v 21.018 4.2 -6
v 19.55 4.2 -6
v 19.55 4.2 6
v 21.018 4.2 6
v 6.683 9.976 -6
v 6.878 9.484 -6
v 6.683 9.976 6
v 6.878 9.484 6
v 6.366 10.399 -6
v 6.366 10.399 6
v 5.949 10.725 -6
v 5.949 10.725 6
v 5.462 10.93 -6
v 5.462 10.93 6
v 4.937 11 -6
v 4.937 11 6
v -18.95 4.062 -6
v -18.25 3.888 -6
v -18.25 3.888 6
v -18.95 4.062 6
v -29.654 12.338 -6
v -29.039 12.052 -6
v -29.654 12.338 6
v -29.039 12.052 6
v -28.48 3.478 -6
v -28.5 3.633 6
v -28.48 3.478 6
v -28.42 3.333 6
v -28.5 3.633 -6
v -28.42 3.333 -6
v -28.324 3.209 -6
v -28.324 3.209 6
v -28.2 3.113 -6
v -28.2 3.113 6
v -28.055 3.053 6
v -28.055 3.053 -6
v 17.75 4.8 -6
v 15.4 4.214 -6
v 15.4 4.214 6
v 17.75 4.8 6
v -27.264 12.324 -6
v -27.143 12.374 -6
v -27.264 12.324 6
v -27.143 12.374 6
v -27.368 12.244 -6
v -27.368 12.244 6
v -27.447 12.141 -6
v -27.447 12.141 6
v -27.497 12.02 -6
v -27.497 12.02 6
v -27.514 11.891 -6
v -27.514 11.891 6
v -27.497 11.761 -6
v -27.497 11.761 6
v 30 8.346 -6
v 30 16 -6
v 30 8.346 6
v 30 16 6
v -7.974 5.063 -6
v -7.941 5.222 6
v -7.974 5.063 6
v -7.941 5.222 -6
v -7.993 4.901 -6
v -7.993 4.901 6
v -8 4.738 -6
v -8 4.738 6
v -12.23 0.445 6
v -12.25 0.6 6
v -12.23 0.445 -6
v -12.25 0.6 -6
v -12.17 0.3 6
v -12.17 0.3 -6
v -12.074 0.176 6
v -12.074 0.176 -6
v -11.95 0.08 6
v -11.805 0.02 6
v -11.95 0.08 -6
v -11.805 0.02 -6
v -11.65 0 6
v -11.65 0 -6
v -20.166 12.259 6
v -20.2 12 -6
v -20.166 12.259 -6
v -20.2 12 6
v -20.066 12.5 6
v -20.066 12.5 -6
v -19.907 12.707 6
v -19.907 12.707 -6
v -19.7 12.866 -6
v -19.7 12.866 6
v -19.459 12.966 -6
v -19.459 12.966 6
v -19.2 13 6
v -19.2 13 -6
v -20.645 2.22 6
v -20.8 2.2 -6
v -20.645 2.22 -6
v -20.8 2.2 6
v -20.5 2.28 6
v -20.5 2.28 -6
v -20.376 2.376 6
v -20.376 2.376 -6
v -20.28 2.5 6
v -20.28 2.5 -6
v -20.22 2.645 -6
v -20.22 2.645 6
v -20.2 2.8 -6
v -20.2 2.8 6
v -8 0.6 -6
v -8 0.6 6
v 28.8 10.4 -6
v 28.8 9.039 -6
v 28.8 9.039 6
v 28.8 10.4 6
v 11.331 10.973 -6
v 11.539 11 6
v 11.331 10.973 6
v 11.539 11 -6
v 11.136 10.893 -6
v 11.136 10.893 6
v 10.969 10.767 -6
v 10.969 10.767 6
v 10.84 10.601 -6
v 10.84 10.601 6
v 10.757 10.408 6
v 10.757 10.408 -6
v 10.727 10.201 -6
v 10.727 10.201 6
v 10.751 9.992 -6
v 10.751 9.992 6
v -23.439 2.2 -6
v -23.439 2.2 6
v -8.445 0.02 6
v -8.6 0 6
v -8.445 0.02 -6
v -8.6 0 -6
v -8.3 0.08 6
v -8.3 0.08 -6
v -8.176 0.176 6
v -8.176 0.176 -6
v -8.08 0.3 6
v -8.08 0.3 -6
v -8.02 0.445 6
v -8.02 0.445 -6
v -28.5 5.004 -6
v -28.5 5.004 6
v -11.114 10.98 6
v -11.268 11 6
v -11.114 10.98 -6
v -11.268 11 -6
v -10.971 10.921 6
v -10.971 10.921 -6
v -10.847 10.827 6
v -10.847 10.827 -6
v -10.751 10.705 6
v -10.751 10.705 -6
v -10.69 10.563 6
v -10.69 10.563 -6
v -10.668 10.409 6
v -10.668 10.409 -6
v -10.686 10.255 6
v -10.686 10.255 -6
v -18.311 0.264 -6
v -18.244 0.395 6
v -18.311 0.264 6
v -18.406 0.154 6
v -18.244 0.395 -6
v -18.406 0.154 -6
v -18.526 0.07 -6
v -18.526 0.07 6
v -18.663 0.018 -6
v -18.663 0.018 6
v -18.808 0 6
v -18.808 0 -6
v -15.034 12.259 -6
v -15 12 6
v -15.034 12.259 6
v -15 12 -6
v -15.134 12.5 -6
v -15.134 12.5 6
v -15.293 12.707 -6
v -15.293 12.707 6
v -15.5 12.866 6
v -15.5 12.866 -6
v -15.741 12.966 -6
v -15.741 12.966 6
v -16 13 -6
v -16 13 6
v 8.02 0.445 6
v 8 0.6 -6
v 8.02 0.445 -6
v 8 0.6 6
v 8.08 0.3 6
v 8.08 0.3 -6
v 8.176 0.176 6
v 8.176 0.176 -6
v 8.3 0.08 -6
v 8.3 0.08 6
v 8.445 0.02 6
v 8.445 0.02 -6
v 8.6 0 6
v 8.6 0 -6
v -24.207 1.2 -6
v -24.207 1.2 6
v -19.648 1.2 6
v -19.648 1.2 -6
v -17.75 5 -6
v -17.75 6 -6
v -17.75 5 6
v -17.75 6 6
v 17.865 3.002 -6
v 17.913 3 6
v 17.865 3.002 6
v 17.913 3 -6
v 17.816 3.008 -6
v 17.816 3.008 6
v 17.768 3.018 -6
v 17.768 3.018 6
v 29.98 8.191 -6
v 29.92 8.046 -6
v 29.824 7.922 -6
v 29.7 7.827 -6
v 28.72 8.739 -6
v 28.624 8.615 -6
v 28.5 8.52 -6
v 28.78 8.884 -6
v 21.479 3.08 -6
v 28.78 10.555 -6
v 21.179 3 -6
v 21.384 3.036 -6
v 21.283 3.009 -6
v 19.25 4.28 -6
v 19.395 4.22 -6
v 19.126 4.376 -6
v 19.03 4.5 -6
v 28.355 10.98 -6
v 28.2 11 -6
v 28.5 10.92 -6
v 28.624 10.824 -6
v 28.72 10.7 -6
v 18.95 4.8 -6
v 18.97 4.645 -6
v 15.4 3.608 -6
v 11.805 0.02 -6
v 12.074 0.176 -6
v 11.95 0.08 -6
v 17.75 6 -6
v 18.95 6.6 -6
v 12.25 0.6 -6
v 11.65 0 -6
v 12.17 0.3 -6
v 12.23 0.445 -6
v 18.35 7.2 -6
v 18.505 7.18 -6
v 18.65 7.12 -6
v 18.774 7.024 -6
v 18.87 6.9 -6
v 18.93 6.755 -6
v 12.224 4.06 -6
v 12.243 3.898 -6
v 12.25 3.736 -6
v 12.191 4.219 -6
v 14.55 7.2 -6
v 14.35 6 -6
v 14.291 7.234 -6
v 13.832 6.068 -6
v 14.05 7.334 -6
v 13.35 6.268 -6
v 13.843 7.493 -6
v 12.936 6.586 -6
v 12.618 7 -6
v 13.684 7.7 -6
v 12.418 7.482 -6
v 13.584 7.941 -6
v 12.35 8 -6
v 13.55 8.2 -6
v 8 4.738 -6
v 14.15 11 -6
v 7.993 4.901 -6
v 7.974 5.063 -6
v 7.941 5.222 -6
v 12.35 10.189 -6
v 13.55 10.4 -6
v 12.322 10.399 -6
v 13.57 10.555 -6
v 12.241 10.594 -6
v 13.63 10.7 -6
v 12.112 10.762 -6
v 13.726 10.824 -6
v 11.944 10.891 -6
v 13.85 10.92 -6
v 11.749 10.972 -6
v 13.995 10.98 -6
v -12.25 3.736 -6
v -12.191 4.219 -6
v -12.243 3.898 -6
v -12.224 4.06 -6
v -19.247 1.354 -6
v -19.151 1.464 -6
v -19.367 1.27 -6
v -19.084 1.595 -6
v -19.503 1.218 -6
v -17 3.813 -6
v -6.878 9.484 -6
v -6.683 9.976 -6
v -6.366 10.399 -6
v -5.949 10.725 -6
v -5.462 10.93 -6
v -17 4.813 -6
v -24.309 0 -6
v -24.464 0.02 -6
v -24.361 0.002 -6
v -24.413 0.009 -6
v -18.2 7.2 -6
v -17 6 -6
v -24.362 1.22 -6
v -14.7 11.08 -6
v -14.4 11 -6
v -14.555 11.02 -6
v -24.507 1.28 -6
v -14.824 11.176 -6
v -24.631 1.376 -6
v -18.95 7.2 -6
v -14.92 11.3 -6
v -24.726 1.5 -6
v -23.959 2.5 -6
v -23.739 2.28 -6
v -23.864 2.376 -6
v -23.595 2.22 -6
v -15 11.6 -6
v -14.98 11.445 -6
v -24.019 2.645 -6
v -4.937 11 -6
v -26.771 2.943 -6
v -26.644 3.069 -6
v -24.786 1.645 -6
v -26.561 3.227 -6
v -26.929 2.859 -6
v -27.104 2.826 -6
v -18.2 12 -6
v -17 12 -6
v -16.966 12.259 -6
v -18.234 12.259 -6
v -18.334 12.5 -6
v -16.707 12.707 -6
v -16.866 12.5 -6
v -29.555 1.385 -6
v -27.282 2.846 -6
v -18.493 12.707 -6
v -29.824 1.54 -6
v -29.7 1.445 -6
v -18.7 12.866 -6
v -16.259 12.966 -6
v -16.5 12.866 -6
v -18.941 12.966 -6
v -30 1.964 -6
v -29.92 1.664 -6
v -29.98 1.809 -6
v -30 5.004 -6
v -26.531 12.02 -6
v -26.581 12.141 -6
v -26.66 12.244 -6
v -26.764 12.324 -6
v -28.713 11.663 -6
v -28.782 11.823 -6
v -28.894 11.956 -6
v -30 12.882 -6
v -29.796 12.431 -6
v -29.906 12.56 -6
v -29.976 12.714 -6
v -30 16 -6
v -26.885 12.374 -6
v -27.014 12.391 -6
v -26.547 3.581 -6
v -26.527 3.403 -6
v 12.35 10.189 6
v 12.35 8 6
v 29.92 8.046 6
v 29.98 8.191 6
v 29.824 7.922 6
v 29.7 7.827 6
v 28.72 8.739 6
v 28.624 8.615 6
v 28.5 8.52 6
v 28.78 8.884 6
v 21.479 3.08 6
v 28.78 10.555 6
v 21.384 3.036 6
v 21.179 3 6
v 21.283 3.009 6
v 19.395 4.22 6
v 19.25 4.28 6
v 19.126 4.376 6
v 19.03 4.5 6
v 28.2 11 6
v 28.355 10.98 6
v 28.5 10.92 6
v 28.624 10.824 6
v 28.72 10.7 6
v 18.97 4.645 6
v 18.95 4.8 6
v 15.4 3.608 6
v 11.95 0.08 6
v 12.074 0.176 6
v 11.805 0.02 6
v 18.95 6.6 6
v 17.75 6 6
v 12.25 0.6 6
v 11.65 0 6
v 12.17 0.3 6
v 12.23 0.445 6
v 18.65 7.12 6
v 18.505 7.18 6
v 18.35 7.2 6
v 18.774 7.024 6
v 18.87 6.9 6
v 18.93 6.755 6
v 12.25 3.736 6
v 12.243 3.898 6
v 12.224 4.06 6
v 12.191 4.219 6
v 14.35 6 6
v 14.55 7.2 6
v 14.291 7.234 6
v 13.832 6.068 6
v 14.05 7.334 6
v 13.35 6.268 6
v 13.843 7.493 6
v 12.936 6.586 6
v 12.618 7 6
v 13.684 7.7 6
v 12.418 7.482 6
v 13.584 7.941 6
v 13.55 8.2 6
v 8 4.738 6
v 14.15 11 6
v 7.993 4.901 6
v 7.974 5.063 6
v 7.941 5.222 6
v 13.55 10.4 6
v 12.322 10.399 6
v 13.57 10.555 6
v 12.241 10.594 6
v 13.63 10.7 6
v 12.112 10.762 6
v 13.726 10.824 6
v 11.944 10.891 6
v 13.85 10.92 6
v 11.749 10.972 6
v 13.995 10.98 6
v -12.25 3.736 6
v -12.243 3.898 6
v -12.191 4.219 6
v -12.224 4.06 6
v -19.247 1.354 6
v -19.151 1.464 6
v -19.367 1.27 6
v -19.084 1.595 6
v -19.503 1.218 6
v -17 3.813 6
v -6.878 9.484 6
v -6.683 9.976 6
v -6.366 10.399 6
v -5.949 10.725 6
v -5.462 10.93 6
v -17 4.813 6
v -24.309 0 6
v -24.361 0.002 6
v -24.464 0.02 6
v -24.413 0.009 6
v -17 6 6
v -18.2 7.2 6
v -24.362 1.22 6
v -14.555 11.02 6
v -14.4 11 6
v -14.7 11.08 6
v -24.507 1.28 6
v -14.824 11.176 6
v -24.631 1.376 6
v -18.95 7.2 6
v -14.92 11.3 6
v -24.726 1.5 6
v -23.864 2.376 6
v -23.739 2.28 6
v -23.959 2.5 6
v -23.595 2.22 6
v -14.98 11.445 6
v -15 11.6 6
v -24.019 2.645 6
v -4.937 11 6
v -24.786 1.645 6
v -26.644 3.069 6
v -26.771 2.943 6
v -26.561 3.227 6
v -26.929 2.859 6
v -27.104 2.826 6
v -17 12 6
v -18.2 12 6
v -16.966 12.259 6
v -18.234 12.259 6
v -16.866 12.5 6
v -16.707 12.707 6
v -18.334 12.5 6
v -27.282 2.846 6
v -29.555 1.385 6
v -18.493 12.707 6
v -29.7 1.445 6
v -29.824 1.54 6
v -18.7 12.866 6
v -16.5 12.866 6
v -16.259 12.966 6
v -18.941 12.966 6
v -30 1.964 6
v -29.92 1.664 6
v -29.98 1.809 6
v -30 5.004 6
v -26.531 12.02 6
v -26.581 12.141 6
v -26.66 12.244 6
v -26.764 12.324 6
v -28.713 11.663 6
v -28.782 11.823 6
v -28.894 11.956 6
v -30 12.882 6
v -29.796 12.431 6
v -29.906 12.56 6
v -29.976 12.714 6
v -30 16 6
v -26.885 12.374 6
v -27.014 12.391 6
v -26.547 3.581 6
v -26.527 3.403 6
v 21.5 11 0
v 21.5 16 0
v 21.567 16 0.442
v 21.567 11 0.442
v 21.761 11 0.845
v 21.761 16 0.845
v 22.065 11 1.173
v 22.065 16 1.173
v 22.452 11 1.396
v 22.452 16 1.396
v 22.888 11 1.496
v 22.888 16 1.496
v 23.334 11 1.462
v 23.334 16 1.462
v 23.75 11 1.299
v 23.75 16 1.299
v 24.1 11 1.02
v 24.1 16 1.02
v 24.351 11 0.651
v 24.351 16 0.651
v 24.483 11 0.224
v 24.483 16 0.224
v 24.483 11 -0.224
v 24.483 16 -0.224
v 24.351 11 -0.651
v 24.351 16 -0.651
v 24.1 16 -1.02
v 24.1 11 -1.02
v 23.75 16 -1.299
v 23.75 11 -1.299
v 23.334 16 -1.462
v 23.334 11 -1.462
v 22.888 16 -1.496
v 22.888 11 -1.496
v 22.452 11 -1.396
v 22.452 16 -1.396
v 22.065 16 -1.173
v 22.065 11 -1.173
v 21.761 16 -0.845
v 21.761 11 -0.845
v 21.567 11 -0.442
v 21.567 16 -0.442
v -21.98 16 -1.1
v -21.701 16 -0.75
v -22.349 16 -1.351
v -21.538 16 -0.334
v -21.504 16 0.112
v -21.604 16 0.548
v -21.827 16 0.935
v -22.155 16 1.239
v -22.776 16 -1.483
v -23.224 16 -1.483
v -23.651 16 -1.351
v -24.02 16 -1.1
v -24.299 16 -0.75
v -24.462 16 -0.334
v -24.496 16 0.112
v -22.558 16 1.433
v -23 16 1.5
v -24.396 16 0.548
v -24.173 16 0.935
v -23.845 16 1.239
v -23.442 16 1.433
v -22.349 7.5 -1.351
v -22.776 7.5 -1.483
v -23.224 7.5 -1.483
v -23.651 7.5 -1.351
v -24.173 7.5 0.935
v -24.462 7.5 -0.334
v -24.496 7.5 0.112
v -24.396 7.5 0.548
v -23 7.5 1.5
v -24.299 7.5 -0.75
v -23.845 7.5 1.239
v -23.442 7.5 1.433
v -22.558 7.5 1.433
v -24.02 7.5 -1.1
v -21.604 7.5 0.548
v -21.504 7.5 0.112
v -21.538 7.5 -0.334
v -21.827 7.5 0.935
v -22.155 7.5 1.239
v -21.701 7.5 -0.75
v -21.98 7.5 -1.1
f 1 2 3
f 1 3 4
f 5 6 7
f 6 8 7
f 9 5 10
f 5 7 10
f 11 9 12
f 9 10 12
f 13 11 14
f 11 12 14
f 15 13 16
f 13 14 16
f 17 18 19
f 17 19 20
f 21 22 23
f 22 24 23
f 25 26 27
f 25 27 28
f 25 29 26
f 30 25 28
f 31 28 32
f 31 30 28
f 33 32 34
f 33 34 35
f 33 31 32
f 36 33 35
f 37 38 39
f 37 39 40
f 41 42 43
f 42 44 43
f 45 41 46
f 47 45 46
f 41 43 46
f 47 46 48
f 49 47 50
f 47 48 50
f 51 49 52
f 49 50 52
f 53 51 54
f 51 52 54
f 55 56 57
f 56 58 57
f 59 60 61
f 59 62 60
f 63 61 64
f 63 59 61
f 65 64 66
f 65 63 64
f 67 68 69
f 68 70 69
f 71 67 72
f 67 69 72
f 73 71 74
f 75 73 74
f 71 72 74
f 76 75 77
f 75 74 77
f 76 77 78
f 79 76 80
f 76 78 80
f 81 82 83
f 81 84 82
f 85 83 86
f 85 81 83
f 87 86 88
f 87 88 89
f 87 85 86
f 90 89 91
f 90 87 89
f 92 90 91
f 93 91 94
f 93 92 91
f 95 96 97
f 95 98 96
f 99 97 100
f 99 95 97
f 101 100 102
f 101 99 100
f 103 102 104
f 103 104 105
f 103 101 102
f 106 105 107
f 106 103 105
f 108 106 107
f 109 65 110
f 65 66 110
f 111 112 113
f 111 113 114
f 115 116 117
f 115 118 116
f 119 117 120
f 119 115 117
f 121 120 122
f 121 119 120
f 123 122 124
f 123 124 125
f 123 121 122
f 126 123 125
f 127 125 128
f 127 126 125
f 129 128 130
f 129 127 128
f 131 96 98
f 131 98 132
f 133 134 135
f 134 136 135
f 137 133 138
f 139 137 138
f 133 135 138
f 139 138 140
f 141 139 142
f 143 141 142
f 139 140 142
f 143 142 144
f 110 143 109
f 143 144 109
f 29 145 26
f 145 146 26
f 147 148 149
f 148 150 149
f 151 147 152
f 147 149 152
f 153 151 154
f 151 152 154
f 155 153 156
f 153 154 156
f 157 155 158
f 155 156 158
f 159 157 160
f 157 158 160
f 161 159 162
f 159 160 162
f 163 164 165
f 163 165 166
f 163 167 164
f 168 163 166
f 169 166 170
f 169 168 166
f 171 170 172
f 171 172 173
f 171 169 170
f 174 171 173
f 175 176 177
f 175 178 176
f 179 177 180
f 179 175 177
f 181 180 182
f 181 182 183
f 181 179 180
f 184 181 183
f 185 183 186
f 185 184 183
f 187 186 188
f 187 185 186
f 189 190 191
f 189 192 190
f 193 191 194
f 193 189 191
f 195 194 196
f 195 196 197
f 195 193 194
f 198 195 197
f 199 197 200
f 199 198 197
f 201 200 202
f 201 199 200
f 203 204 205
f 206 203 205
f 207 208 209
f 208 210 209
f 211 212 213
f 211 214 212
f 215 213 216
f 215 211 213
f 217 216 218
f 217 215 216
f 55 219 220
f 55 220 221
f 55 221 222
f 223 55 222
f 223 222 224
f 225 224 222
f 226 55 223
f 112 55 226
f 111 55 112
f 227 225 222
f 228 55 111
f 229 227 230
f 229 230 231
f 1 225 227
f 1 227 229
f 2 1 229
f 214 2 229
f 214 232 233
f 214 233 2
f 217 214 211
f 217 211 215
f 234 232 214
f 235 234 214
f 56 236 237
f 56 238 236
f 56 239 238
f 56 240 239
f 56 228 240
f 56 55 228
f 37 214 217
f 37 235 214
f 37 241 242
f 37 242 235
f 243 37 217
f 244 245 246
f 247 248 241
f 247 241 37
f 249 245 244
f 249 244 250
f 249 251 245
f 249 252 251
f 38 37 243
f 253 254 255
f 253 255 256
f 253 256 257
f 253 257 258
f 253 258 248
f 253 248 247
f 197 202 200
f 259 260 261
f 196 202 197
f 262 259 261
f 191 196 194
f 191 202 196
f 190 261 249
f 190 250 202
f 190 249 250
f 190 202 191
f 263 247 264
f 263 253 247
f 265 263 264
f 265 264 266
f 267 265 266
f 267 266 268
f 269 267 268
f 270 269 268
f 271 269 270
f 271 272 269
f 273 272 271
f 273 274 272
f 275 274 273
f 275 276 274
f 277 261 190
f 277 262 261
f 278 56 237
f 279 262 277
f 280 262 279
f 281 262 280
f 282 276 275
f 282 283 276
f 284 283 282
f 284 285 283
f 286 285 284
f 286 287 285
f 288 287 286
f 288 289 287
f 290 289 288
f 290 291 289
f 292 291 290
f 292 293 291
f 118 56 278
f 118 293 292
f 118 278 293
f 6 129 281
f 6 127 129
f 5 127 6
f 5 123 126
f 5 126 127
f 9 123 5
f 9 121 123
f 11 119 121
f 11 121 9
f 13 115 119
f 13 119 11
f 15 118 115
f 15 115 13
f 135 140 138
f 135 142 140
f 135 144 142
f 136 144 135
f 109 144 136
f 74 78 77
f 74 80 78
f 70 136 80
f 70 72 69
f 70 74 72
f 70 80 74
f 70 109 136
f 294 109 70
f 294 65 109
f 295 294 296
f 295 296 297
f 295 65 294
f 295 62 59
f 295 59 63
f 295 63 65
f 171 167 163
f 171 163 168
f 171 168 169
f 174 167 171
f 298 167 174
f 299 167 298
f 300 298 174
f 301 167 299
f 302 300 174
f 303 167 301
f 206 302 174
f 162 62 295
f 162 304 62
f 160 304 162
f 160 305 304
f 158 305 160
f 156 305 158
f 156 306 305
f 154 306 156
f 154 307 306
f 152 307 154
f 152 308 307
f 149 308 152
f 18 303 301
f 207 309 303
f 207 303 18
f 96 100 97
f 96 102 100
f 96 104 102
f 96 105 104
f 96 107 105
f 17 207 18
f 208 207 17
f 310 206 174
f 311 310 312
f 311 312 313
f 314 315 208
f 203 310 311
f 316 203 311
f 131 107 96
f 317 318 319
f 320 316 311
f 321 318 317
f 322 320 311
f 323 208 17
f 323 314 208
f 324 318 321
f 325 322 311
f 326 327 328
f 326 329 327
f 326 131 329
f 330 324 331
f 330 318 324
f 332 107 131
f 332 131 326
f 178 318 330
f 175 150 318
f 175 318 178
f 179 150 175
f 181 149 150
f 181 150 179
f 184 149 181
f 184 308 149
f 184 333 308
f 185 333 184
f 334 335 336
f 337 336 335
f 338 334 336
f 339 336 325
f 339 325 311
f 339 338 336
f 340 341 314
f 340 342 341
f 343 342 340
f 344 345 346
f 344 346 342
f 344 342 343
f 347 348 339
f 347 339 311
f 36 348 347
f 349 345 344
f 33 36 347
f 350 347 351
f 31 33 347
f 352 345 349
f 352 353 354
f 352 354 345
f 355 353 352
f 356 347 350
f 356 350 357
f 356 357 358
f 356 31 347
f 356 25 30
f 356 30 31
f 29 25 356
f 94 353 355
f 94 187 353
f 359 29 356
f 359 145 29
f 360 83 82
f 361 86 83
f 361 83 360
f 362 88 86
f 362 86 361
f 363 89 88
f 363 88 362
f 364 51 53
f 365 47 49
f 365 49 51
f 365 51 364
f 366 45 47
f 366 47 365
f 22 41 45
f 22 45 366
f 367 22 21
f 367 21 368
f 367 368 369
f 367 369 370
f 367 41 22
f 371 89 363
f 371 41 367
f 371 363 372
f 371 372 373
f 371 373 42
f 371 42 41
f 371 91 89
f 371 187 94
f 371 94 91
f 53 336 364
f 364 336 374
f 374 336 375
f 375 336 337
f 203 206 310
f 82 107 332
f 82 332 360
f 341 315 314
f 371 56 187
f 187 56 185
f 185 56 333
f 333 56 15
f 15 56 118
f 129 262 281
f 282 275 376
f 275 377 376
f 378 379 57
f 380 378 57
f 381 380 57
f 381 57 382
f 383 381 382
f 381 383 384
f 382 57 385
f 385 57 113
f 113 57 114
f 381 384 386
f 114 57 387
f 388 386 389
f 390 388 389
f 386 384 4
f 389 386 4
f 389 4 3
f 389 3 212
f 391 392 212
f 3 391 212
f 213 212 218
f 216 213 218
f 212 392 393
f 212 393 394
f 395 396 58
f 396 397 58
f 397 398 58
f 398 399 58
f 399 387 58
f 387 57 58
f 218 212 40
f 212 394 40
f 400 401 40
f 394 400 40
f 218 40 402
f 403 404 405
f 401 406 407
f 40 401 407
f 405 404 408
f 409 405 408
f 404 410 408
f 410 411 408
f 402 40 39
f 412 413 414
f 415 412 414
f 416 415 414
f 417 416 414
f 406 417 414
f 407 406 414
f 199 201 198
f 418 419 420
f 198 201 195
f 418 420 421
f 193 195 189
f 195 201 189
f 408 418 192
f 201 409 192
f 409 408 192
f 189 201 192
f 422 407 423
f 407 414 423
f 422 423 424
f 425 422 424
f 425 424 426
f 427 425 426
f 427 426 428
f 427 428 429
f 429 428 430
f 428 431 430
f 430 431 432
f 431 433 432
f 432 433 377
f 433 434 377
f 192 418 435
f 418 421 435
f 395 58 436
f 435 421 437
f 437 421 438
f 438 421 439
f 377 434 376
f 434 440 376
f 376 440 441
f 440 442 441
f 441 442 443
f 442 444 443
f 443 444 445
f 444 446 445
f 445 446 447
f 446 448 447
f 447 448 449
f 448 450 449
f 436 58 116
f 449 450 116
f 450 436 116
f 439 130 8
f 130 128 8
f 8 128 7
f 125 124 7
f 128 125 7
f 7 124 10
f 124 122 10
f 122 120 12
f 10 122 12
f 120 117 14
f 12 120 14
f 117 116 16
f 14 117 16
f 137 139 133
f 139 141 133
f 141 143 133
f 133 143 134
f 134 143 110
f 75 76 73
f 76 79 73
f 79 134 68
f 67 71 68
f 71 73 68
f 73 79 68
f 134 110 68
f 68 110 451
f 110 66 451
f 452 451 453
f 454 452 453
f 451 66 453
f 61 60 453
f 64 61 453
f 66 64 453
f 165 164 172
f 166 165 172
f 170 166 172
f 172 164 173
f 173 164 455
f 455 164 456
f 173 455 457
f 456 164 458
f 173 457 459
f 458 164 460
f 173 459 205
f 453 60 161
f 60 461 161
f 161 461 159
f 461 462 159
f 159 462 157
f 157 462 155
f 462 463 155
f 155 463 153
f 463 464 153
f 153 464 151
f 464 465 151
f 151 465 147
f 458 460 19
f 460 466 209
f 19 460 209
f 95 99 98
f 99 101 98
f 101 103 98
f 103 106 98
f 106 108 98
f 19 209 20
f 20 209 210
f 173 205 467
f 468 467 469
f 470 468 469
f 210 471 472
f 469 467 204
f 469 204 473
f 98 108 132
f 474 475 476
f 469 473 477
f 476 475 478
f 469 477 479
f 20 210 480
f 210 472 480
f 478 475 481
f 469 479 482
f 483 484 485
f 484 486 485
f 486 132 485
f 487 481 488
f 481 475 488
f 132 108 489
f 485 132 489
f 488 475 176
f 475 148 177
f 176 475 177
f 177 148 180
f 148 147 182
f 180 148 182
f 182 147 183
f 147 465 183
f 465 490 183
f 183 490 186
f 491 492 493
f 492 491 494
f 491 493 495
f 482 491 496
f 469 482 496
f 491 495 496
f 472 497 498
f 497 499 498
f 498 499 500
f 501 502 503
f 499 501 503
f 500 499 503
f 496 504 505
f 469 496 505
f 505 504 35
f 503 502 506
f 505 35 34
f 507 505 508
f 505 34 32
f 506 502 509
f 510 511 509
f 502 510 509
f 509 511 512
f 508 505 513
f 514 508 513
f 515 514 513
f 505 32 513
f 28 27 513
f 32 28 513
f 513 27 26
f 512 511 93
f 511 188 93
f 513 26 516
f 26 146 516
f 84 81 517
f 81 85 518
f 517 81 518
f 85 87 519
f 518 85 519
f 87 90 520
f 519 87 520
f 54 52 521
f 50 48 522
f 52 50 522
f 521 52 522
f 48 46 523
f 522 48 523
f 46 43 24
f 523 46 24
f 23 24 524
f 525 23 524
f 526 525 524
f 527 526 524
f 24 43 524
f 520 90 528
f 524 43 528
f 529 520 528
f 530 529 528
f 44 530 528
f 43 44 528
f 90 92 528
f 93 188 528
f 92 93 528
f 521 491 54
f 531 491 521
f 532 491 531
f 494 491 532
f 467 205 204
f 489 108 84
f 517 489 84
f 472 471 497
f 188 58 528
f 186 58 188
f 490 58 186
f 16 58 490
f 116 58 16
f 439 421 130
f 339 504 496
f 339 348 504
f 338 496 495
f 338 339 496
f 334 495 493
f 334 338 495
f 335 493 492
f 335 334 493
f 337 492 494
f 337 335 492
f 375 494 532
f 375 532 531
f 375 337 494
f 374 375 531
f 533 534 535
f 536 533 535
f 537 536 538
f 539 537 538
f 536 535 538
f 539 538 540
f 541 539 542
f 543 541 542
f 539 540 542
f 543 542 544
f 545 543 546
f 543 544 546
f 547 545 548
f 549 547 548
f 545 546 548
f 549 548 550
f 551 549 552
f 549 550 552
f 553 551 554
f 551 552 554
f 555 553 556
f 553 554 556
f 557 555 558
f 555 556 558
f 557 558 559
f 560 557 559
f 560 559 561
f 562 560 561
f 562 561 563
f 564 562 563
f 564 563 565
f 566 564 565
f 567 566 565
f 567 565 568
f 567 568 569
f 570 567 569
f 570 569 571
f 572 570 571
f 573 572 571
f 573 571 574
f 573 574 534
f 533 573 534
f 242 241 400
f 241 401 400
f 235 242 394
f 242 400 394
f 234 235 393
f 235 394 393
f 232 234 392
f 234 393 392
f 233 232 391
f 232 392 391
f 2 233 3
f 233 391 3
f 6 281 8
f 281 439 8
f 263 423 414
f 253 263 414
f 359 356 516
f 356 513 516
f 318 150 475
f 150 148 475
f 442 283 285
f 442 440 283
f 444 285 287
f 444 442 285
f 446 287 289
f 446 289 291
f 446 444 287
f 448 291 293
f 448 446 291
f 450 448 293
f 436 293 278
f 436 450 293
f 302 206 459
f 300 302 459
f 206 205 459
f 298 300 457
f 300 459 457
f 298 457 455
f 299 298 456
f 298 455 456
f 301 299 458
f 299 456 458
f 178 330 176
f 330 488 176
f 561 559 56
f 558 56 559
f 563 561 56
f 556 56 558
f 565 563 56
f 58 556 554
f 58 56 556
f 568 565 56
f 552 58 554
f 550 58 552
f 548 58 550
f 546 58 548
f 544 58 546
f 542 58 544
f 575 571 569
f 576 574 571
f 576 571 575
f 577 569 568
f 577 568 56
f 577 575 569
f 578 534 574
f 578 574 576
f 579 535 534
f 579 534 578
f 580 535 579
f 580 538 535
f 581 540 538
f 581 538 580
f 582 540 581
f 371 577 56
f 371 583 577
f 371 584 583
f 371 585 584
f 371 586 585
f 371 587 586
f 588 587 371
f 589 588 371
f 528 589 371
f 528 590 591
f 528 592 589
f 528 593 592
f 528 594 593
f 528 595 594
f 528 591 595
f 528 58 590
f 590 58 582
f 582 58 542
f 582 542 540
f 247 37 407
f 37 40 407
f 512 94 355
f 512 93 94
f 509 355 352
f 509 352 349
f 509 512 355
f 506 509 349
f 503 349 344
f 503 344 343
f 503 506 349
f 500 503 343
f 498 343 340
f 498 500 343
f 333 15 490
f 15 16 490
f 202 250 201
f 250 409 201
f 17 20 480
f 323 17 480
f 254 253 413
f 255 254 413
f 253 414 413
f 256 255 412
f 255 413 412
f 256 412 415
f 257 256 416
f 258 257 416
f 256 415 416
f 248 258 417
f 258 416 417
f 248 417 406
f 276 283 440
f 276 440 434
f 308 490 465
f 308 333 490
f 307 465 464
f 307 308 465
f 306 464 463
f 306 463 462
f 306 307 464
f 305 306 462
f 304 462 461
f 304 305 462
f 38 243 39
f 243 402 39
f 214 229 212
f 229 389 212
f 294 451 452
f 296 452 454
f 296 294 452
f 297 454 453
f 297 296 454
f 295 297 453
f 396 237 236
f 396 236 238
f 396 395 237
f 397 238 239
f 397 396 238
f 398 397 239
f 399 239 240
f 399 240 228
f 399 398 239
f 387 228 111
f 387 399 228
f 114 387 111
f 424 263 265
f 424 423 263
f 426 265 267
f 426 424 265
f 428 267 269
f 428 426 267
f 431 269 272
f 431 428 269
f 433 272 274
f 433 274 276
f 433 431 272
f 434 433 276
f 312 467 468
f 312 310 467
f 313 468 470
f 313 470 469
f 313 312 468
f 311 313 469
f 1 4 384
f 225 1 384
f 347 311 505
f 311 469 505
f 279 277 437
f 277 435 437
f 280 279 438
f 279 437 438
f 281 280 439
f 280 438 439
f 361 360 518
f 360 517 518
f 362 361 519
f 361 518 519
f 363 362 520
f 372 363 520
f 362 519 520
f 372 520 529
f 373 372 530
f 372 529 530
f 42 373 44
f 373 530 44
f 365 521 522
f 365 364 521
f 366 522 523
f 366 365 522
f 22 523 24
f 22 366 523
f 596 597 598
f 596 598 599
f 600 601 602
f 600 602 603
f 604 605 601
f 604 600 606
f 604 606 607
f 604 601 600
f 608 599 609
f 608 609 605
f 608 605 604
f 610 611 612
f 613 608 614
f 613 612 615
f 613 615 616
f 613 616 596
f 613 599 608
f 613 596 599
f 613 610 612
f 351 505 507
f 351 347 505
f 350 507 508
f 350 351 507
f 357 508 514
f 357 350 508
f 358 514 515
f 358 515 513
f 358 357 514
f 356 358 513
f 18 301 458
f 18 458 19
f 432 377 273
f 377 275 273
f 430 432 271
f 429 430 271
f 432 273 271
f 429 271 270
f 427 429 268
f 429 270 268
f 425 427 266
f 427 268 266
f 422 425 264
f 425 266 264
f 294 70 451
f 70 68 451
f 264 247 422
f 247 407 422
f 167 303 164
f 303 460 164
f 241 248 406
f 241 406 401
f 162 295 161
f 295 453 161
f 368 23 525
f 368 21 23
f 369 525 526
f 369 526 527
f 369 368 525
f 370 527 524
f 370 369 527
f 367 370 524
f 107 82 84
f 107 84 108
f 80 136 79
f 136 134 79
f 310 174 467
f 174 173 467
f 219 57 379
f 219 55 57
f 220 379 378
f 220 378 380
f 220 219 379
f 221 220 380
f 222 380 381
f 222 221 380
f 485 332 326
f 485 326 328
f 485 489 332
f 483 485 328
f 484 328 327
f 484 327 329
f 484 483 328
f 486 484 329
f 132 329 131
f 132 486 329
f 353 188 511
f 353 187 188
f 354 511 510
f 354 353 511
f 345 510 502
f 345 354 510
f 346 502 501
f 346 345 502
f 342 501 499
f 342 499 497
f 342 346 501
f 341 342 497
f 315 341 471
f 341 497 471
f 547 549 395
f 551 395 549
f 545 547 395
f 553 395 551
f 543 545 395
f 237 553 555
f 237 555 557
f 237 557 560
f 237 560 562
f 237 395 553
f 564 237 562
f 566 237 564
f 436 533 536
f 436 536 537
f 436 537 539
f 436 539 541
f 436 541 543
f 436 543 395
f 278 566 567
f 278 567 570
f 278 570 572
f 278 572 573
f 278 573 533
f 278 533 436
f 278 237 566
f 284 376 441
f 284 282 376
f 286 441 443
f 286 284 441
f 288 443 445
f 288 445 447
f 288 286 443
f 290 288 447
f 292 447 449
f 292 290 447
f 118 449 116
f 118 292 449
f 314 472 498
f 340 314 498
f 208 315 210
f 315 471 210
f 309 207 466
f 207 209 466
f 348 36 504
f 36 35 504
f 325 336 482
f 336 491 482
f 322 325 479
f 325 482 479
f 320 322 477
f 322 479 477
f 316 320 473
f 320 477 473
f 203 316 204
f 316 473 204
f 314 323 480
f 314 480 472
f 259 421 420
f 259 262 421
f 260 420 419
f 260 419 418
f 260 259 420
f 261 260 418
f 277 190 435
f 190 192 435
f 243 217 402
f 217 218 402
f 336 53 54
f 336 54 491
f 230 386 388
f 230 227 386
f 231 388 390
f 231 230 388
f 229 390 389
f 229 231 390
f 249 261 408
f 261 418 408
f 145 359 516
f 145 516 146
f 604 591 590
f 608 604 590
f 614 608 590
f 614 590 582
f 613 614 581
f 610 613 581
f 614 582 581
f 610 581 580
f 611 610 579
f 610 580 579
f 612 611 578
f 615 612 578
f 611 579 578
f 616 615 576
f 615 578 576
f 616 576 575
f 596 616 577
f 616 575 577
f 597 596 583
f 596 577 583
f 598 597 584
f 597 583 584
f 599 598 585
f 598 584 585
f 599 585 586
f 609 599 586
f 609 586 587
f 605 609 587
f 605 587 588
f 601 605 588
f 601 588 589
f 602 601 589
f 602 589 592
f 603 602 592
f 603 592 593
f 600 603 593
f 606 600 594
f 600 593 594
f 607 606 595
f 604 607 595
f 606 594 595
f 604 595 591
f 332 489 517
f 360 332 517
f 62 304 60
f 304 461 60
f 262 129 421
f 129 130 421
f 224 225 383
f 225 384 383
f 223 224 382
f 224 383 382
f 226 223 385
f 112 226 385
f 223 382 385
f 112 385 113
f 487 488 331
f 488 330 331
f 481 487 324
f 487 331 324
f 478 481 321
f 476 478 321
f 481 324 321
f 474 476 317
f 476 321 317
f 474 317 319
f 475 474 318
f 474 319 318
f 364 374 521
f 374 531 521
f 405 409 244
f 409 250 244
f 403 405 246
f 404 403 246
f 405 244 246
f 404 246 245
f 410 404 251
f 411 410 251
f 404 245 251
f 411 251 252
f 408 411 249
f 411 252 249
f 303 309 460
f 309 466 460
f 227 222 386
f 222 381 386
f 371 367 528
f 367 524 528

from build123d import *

# Parameters (mm, degrees)
BOSS_EXTRUDE1_DEPTH     = 6
CUT_EXTRUDE1_DEPTH      = 35.525353003
CUT_EXTRUDE1_DEPTH_BACK = 35.525353003
FILLET1_R               = 2
FILLET2_R               = 1
FILLET3_R               = 0.811424
FILLET4_R               = 2
FILLET5_R               = 1
FILLET6_R               = 1
FILLET7_R               = 0.5
FILLET8_R               = 0.6
SKETCH4_R               = 1.5
CUT_EXTRUDE2_DEPTH      = 8.5


with BuildPart() as part:
    # Sketch2 → Boss-Extrude1 (new, symmetric)
    with BuildSketch(Plane.XY):
        Polygon((6.5, 11), (-6.5, 11), (-8, 4.9838286), (-8, 0), (-12.25, 0), (-12.25, 3.981133366), (-10.5, 11), (-15, 11), (-15, 13), (-17, 13), (-17, 6), (-17.75, 6), (-17.75, 5), (-17, 4.813003998), (-17, 3.813003998), (-18.387819958, 0), (-24.387819958, 0), (-30, 1.50377911), (-30, 5.00377911), (-28.5, 5.00377911), (-28.5, 3.172407682), (-26.2783706, 2.577123878), (-28.785442178, 11.933642386), (-30, 12.5), (-30, 16), (0, 16), (30, 16), (30, 8), (21.339745962, 3), (17.839745962, 3), (15.4, 3.608296988), (15.4, 4.214079193), (17.75, 4.8), (17.75, 6), (12.35, 6), (12.35, 11), (10.5, 11), (12.25, 3.981133366), (12.25, 0), (8, 0), (8, 4.9838286), align=None)
    extrude(amount=BOSS_EXTRUDE1_DEPTH, both=True)

    # Sketch3 → Cut-Extrude1 (cut, two sides: drawn at the far end of the back side and taken through both)
    with BuildSketch(Plane.XY.offset(-CUT_EXTRUDE1_DEPTH_BACK)):
        Polygon((-27.626331186, 12.24422524), (-24.667039952, 1.2), (-19.228069004, 1.2), (-18.249764702, 3.88786898), (-18.95, 4.062457248), (-18.95, 7.2), (-18.2, 7.2), (-18.2, 13), (-20.2, 13), (-20.2, 2.2), (-23.899712964, 2.2), (-26.66040536, 12.503044285), align=None)
        Polygon((13.55, 11), (13.55, 7.2), (18.95, 7.2), (18.95, 4.2), (21.018206931, 4.2), (28.8, 8.692820323), (28.8, 11), align=None)
    extrude(amount=CUT_EXTRUDE1_DEPTH + CUT_EXTRUDE1_DEPTH_BACK, mode=Mode.SUBTRACT)

    # Fillet1
    fillet1_edges = [part.edges().sort_by_distance(p)[0] for p in [
        (12.35, 6, 0),
    ]]
    fillet(fillet1_edges, radius=FILLET1_R)

    # Fillet2
    fillet2_edges = [part.edges().sort_by_distance(p)[0] for p in [
        (13.55, 7.2, 0),
    ]]
    fillet(fillet2_edges, radius=FILLET2_R)

    # Fillet3
    fillet3_edges = [part.edges().sort_by_distance(p)[0] for p in [
        (12.35, 11, 0),
        (10.5, 11, 0),
    ]]
    fillet(fillet3_edges, radius=FILLET3_R)

    # Fillet4
    fillet4_edges = [part.edges().sort_by_distance(p)[0] for p in [
        (12.25, 3.981133366, 0),
        (8, 4.9838286, 0),
        (6.5, 11, 0),
        (-6.5, 11, 0),
        (-8, 4.9838286, 0),
        (-12.25, 3.981133366, 0),
    ]]
    fillet(fillet4_edges, radius=FILLET4_R)

    # Fillet5
    fillet5_edges = [part.edges().sort_by_distance(p)[0] for p in [
        (-20.2, 13, 0),
        (-18.2, 13, 0),
    ]]
    fillet(fillet5_edges, radius=FILLET5_R - 0.0001)  # a hair under: the kernel refuses the full size

    # Fillet6
    fillet6_edges = [part.edges().sort_by_distance(p)[0] for p in [
        (-15, 13, 0),
        (-17, 13, 0),
    ]]
    fillet(fillet6_edges, radius=FILLET6_R - 0.0001)  # a hair under: the kernel refuses the full size

    # Fillet7
    fillet7_edges = [part.edges().sort_by_distance(p)[0] for p in [
        (-27.626331186, 12.24422524, 0),
        (-26.66040536, 12.503044285, 0),
    ]]
    fillet(fillet7_edges, radius=FILLET7_R - 0.0001)  # a hair under: the kernel refuses the full size

    # Fillet8
    fillet8_edges = [part.edges().sort_by_distance(p)[0] for p in [
        (-23.899712964, 2.2, 0),
        (-20.2, 2.2, 0),
        (-19.228069004, 1.2, 0),
        (-24.667039952, 1.2, 0),
        (13.55, 11, 0),
        (28.8, 11, 0),
        (28.8, 8.692820323, 0),
        (18.95, 4.2, 0),
        (18.95, 7.2, 0),
        (12.25, 0, 0),
        (8, 0, 0),
        (-8, 0, 0),
        (-12.25, 0, 0),
        (-10.5, 11, 0),
        (-15, 11, 0),
        (-18.387819958, 0, 0),
        (-24.387819958, 0, 0),
        (-30, 1.50377911, 0),
        (-28.5, 3.172407682, 0),
        (-26.2783706, 2.577123878, 0),
        (-28.785442178, 11.933642386, 0),
        (-30, 12.5, 0),
        (30, 8, 0),
        (21.339745962, 3, 0),
        (17.839745962, 3, 0),
    ]]
    fillet(fillet8_edges, radius=FILLET8_R)

    # Sketch4 → Cut-Extrude2 (cut)
    with BuildSketch(Plane(origin=(0, 16, 0), x_dir=(1, 0, 0), z_dir=(0, 1, 0))):
        with Locations(Location((-23, 0, 0), (0, 0, 270))):
            Circle(SKETCH4_R)
        with Locations(Location((23, 0, 0), (0, 0, 180))):
            Circle(SKETCH4_R)
    extrude(amount=-CUT_EXTRUDE2_DEPTH, mode=Mode.SUBTRACT)


solid = part.part
